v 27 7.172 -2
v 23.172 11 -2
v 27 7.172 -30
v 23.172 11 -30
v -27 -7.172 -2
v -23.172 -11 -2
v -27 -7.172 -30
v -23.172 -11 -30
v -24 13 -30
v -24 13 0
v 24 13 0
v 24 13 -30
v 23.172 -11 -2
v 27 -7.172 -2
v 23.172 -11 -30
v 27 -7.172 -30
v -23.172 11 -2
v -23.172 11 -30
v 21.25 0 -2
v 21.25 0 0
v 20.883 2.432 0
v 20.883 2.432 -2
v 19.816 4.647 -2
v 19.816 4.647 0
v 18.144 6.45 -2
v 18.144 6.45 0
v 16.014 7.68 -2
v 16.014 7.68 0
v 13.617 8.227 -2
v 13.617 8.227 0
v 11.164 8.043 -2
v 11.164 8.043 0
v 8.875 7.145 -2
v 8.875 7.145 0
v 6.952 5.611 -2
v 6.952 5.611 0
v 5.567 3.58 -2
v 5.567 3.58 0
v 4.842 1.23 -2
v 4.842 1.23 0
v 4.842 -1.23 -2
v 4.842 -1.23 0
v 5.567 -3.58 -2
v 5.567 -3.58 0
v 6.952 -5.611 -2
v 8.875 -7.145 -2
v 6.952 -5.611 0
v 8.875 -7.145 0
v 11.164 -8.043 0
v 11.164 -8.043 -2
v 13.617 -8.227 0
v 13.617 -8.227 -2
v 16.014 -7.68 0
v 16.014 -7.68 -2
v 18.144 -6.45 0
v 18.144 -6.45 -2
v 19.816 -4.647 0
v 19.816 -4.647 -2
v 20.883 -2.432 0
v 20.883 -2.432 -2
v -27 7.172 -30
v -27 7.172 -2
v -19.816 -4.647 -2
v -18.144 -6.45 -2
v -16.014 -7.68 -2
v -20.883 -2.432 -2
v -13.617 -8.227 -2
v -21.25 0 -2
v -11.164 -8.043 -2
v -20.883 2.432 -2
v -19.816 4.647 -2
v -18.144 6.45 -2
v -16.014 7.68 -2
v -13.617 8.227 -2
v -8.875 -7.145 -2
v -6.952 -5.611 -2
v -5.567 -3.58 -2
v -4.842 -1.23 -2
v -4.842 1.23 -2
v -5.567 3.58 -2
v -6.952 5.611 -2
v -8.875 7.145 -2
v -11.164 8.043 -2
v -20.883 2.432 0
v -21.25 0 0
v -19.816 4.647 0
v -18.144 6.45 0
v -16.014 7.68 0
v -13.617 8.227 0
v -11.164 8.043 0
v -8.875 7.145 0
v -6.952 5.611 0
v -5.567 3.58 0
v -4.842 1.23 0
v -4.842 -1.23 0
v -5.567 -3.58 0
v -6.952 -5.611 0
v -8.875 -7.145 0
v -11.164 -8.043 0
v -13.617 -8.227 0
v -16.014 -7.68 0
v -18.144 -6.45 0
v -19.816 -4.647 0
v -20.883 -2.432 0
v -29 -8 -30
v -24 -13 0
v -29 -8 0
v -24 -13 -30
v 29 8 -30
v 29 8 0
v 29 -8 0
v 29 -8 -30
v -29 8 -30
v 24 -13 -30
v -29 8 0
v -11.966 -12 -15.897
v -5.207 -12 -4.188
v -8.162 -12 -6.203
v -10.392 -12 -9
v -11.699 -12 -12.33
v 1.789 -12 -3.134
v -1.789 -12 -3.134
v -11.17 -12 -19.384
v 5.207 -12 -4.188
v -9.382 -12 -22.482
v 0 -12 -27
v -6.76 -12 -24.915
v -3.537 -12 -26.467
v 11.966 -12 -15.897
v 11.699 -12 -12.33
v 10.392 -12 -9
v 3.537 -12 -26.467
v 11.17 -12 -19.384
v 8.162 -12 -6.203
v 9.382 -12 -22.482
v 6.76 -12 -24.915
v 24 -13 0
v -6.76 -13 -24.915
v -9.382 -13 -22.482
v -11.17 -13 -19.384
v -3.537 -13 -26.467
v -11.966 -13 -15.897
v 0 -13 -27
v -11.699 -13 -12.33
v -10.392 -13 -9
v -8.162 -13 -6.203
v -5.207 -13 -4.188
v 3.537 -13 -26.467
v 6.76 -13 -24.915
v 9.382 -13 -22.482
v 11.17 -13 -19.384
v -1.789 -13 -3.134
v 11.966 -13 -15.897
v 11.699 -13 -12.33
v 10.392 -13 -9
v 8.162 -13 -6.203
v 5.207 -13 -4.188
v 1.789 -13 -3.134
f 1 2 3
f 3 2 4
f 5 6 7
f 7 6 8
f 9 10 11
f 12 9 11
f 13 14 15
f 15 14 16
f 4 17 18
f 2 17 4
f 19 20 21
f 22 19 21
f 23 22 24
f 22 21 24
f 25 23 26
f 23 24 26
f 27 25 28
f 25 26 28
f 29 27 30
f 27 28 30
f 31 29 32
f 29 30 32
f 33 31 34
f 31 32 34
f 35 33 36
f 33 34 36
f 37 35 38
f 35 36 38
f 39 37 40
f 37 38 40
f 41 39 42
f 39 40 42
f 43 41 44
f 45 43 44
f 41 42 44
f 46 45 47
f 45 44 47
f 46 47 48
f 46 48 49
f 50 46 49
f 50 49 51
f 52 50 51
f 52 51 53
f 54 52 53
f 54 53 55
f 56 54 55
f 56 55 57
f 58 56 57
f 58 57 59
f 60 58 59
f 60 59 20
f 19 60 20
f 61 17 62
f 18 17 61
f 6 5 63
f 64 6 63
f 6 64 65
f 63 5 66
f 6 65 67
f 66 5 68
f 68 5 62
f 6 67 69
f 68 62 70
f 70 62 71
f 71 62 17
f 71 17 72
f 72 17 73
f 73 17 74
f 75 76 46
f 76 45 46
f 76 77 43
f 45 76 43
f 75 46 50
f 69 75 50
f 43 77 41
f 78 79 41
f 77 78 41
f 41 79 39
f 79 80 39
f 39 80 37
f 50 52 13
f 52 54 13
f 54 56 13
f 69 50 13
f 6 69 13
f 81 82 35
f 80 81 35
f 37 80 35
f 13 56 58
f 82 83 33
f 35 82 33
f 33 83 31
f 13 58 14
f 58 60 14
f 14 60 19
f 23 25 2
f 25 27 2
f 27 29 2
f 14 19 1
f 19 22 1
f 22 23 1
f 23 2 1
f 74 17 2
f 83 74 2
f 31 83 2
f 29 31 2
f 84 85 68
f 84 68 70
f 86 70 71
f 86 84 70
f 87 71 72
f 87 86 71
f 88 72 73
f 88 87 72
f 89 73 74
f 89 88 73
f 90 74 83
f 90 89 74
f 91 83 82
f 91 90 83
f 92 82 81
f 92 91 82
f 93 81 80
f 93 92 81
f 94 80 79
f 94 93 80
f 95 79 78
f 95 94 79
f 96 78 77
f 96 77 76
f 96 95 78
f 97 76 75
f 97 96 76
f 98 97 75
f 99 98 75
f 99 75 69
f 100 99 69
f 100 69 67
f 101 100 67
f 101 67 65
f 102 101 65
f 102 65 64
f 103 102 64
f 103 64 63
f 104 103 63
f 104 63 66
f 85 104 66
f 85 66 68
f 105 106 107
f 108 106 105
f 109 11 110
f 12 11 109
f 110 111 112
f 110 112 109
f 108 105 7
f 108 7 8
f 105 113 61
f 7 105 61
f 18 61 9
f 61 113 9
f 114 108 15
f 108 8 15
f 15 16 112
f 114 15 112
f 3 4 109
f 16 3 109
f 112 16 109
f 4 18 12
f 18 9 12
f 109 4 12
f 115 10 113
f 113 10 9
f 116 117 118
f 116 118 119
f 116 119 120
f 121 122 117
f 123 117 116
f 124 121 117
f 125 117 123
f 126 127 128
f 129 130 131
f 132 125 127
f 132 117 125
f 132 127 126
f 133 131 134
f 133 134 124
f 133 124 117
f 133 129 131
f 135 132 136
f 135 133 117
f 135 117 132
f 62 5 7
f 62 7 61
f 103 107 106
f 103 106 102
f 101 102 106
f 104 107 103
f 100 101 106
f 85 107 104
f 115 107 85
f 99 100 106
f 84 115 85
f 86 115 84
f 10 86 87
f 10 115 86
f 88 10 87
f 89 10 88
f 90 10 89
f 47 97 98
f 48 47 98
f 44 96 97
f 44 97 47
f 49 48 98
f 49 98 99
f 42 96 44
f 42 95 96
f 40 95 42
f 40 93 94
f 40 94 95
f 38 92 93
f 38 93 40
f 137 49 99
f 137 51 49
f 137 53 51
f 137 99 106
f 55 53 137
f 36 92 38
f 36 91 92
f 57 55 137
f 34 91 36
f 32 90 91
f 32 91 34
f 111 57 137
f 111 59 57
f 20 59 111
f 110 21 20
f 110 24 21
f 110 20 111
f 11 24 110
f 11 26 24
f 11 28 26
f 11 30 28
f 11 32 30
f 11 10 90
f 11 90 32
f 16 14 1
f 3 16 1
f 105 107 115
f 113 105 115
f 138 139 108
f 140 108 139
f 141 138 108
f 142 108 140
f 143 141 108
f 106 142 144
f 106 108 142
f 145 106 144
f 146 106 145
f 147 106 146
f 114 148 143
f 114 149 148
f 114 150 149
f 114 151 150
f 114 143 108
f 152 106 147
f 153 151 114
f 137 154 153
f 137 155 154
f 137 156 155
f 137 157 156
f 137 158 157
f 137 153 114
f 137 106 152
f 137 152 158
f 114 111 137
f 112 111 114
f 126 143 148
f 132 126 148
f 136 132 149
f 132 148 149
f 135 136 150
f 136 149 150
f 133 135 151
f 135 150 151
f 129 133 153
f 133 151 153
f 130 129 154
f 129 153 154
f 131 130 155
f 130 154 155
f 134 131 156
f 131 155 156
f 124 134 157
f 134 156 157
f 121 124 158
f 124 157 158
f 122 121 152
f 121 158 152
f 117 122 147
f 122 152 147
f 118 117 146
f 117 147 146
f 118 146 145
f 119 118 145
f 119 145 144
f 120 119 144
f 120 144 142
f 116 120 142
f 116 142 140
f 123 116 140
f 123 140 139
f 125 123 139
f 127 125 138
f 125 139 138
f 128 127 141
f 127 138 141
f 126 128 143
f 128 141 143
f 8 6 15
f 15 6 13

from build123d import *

# Parameters (mm, degrees)
SKETCH1_W          = 58
SKETCH1_H          = 26
SKULL_BLOCK_DEPTH  = 30
SKULL_CHAMFER_SIZE = 5
HOLLOW_SKULL_T     = -2
EYE_HOLE_REACH     = 45.704
SKETCH2_R          = 8.25
SKETCH3_R          = 12
NECK_MOUNT_DEPTH   = 1


with BuildPart() as part:
    # Sketch1 → skull block (new body)
    with BuildSketch(Plane.XY):
        Rectangle(SKETCH1_W, SKETCH1_H)
    extrude(amount=-SKULL_BLOCK_DEPTH)

    # skull chamfer
    skull_chamfer_edges = [part.edges().sort_by_distance(p)[0] for p in [
        (29, -13, -15),
        (-29, -13, -15),
        (-29, 13, -15),
        (29, 13, -15),
    ]]
    chamfer(skull_chamfer_edges, length=SKULL_CHAMFER_SIZE)

    # hollow skull
    hollow_skull_openings = [part.faces().sort_by_distance(p)[0] for p in [
        (0, 0, -30),
    ]]
    offset(amount=HOLLOW_SKULL_T, openings=hollow_skull_openings, kind=Kind.INTERSECTION)

    # Sketch2 → eye hole (cut, up to next)
    with BuildSketch(Plane.XY, mode=Mode.PRIVATE) as eye_hole_sk1:
        with Locations((13, 0)):
            Circle(SKETCH2_R)
    eye_hole_tool1 = extrude(eye_hole_sk1.sketch, amount=-EYE_HOLE_REACH, mode=Mode.PRIVATE) & part.part
    eye_hole = eye_hole_tool1.solids().sort_by_distance((13, 0, 0))[0]
    add(eye_hole, mode=Mode.SUBTRACT)

    # mirror eye hole: eye hole across plane
    add(eye_hole.mirror(Plane(origin=(0, 0, 0), x_dir=(0, 0, 1), z_dir=(1, 0, 0))), mode=Mode.SUBTRACT)

    # Sketch3 → neck mount (cut)
    with BuildSketch(Plane.XZ.offset(13)):
        with Locations(Location((0, -15, 0), (0, 0, 270))):
            Circle(SKETCH3_R)
    extrude(amount=-NECK_MOUNT_DEPTH, mode=Mode.SUBTRACT)


solid = part.part
